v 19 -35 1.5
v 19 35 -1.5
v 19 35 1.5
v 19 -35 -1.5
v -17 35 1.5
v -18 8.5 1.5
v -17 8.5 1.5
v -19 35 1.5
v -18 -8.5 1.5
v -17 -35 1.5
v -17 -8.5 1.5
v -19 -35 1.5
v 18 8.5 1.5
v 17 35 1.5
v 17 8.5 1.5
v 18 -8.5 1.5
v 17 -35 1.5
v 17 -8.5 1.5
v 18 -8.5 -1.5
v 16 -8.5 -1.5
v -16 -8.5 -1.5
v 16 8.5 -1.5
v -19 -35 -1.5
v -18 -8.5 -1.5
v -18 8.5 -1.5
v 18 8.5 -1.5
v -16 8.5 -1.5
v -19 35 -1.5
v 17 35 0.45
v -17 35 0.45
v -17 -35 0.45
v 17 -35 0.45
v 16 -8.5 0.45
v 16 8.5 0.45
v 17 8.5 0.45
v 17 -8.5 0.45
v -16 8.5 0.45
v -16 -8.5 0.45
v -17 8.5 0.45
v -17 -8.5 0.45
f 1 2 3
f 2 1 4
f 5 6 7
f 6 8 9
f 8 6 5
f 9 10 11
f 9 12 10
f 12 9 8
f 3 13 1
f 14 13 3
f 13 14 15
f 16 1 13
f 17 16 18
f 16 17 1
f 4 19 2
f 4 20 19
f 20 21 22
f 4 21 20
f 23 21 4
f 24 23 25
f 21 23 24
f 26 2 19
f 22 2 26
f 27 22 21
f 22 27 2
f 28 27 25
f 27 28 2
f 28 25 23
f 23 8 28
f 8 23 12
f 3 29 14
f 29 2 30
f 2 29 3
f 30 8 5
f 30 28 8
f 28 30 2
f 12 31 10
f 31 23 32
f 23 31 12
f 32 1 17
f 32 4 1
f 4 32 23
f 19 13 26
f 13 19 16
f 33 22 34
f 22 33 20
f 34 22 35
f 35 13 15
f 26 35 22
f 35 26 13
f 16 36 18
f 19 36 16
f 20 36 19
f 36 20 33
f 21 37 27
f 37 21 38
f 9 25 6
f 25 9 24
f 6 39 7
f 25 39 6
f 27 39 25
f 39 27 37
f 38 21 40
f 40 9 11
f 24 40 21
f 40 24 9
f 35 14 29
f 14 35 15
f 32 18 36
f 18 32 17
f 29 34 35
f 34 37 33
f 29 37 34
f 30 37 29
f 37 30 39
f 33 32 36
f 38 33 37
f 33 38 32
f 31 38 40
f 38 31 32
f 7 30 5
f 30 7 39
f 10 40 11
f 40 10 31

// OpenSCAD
//Lipo Strap Plate for T4bee Frame
//Frame: https://www.thingiverse.com/thing:1783281

//Aproximate sizes for reference
//Nanotech 3s 1000mah - 33x72
//Nanotech 3s 1300mah 34x72
//LiHV 850mah 34x78
//LiHV 1000mah 34x72
//Nanotech 3s 850 30x34
//3s 11100 34x77
//Nanotech 4s 30x55.5

width=38;
length=70;
thickness=3;
slot_distance=34;
slot_size=2;
slot_width=17;

middle_cutout_width=34;
middle_cutout_length=length;
middle_cutout_height=1;

n=0.1;

difference() {
    
    //Plate
    cube([width,length,thickness],center=true);
    
    //Slots
    translate([slot_distance*0.5,0,0])
        cube([slot_size,slot_width,thickness+n],center=true);
    
    translate([-slot_distance*0.5,0,0])
        cube([slot_size,slot_width,thickness+n],center=true);
    
    //Middle cutout for tape/lipo etc.
    translate([0,0,thickness*0.5-middle_cutout_height*0.5])
        cube([middle_cutout_width,middle_cutout_length+n,middle_cutout_height+n],center=true);
    
}
